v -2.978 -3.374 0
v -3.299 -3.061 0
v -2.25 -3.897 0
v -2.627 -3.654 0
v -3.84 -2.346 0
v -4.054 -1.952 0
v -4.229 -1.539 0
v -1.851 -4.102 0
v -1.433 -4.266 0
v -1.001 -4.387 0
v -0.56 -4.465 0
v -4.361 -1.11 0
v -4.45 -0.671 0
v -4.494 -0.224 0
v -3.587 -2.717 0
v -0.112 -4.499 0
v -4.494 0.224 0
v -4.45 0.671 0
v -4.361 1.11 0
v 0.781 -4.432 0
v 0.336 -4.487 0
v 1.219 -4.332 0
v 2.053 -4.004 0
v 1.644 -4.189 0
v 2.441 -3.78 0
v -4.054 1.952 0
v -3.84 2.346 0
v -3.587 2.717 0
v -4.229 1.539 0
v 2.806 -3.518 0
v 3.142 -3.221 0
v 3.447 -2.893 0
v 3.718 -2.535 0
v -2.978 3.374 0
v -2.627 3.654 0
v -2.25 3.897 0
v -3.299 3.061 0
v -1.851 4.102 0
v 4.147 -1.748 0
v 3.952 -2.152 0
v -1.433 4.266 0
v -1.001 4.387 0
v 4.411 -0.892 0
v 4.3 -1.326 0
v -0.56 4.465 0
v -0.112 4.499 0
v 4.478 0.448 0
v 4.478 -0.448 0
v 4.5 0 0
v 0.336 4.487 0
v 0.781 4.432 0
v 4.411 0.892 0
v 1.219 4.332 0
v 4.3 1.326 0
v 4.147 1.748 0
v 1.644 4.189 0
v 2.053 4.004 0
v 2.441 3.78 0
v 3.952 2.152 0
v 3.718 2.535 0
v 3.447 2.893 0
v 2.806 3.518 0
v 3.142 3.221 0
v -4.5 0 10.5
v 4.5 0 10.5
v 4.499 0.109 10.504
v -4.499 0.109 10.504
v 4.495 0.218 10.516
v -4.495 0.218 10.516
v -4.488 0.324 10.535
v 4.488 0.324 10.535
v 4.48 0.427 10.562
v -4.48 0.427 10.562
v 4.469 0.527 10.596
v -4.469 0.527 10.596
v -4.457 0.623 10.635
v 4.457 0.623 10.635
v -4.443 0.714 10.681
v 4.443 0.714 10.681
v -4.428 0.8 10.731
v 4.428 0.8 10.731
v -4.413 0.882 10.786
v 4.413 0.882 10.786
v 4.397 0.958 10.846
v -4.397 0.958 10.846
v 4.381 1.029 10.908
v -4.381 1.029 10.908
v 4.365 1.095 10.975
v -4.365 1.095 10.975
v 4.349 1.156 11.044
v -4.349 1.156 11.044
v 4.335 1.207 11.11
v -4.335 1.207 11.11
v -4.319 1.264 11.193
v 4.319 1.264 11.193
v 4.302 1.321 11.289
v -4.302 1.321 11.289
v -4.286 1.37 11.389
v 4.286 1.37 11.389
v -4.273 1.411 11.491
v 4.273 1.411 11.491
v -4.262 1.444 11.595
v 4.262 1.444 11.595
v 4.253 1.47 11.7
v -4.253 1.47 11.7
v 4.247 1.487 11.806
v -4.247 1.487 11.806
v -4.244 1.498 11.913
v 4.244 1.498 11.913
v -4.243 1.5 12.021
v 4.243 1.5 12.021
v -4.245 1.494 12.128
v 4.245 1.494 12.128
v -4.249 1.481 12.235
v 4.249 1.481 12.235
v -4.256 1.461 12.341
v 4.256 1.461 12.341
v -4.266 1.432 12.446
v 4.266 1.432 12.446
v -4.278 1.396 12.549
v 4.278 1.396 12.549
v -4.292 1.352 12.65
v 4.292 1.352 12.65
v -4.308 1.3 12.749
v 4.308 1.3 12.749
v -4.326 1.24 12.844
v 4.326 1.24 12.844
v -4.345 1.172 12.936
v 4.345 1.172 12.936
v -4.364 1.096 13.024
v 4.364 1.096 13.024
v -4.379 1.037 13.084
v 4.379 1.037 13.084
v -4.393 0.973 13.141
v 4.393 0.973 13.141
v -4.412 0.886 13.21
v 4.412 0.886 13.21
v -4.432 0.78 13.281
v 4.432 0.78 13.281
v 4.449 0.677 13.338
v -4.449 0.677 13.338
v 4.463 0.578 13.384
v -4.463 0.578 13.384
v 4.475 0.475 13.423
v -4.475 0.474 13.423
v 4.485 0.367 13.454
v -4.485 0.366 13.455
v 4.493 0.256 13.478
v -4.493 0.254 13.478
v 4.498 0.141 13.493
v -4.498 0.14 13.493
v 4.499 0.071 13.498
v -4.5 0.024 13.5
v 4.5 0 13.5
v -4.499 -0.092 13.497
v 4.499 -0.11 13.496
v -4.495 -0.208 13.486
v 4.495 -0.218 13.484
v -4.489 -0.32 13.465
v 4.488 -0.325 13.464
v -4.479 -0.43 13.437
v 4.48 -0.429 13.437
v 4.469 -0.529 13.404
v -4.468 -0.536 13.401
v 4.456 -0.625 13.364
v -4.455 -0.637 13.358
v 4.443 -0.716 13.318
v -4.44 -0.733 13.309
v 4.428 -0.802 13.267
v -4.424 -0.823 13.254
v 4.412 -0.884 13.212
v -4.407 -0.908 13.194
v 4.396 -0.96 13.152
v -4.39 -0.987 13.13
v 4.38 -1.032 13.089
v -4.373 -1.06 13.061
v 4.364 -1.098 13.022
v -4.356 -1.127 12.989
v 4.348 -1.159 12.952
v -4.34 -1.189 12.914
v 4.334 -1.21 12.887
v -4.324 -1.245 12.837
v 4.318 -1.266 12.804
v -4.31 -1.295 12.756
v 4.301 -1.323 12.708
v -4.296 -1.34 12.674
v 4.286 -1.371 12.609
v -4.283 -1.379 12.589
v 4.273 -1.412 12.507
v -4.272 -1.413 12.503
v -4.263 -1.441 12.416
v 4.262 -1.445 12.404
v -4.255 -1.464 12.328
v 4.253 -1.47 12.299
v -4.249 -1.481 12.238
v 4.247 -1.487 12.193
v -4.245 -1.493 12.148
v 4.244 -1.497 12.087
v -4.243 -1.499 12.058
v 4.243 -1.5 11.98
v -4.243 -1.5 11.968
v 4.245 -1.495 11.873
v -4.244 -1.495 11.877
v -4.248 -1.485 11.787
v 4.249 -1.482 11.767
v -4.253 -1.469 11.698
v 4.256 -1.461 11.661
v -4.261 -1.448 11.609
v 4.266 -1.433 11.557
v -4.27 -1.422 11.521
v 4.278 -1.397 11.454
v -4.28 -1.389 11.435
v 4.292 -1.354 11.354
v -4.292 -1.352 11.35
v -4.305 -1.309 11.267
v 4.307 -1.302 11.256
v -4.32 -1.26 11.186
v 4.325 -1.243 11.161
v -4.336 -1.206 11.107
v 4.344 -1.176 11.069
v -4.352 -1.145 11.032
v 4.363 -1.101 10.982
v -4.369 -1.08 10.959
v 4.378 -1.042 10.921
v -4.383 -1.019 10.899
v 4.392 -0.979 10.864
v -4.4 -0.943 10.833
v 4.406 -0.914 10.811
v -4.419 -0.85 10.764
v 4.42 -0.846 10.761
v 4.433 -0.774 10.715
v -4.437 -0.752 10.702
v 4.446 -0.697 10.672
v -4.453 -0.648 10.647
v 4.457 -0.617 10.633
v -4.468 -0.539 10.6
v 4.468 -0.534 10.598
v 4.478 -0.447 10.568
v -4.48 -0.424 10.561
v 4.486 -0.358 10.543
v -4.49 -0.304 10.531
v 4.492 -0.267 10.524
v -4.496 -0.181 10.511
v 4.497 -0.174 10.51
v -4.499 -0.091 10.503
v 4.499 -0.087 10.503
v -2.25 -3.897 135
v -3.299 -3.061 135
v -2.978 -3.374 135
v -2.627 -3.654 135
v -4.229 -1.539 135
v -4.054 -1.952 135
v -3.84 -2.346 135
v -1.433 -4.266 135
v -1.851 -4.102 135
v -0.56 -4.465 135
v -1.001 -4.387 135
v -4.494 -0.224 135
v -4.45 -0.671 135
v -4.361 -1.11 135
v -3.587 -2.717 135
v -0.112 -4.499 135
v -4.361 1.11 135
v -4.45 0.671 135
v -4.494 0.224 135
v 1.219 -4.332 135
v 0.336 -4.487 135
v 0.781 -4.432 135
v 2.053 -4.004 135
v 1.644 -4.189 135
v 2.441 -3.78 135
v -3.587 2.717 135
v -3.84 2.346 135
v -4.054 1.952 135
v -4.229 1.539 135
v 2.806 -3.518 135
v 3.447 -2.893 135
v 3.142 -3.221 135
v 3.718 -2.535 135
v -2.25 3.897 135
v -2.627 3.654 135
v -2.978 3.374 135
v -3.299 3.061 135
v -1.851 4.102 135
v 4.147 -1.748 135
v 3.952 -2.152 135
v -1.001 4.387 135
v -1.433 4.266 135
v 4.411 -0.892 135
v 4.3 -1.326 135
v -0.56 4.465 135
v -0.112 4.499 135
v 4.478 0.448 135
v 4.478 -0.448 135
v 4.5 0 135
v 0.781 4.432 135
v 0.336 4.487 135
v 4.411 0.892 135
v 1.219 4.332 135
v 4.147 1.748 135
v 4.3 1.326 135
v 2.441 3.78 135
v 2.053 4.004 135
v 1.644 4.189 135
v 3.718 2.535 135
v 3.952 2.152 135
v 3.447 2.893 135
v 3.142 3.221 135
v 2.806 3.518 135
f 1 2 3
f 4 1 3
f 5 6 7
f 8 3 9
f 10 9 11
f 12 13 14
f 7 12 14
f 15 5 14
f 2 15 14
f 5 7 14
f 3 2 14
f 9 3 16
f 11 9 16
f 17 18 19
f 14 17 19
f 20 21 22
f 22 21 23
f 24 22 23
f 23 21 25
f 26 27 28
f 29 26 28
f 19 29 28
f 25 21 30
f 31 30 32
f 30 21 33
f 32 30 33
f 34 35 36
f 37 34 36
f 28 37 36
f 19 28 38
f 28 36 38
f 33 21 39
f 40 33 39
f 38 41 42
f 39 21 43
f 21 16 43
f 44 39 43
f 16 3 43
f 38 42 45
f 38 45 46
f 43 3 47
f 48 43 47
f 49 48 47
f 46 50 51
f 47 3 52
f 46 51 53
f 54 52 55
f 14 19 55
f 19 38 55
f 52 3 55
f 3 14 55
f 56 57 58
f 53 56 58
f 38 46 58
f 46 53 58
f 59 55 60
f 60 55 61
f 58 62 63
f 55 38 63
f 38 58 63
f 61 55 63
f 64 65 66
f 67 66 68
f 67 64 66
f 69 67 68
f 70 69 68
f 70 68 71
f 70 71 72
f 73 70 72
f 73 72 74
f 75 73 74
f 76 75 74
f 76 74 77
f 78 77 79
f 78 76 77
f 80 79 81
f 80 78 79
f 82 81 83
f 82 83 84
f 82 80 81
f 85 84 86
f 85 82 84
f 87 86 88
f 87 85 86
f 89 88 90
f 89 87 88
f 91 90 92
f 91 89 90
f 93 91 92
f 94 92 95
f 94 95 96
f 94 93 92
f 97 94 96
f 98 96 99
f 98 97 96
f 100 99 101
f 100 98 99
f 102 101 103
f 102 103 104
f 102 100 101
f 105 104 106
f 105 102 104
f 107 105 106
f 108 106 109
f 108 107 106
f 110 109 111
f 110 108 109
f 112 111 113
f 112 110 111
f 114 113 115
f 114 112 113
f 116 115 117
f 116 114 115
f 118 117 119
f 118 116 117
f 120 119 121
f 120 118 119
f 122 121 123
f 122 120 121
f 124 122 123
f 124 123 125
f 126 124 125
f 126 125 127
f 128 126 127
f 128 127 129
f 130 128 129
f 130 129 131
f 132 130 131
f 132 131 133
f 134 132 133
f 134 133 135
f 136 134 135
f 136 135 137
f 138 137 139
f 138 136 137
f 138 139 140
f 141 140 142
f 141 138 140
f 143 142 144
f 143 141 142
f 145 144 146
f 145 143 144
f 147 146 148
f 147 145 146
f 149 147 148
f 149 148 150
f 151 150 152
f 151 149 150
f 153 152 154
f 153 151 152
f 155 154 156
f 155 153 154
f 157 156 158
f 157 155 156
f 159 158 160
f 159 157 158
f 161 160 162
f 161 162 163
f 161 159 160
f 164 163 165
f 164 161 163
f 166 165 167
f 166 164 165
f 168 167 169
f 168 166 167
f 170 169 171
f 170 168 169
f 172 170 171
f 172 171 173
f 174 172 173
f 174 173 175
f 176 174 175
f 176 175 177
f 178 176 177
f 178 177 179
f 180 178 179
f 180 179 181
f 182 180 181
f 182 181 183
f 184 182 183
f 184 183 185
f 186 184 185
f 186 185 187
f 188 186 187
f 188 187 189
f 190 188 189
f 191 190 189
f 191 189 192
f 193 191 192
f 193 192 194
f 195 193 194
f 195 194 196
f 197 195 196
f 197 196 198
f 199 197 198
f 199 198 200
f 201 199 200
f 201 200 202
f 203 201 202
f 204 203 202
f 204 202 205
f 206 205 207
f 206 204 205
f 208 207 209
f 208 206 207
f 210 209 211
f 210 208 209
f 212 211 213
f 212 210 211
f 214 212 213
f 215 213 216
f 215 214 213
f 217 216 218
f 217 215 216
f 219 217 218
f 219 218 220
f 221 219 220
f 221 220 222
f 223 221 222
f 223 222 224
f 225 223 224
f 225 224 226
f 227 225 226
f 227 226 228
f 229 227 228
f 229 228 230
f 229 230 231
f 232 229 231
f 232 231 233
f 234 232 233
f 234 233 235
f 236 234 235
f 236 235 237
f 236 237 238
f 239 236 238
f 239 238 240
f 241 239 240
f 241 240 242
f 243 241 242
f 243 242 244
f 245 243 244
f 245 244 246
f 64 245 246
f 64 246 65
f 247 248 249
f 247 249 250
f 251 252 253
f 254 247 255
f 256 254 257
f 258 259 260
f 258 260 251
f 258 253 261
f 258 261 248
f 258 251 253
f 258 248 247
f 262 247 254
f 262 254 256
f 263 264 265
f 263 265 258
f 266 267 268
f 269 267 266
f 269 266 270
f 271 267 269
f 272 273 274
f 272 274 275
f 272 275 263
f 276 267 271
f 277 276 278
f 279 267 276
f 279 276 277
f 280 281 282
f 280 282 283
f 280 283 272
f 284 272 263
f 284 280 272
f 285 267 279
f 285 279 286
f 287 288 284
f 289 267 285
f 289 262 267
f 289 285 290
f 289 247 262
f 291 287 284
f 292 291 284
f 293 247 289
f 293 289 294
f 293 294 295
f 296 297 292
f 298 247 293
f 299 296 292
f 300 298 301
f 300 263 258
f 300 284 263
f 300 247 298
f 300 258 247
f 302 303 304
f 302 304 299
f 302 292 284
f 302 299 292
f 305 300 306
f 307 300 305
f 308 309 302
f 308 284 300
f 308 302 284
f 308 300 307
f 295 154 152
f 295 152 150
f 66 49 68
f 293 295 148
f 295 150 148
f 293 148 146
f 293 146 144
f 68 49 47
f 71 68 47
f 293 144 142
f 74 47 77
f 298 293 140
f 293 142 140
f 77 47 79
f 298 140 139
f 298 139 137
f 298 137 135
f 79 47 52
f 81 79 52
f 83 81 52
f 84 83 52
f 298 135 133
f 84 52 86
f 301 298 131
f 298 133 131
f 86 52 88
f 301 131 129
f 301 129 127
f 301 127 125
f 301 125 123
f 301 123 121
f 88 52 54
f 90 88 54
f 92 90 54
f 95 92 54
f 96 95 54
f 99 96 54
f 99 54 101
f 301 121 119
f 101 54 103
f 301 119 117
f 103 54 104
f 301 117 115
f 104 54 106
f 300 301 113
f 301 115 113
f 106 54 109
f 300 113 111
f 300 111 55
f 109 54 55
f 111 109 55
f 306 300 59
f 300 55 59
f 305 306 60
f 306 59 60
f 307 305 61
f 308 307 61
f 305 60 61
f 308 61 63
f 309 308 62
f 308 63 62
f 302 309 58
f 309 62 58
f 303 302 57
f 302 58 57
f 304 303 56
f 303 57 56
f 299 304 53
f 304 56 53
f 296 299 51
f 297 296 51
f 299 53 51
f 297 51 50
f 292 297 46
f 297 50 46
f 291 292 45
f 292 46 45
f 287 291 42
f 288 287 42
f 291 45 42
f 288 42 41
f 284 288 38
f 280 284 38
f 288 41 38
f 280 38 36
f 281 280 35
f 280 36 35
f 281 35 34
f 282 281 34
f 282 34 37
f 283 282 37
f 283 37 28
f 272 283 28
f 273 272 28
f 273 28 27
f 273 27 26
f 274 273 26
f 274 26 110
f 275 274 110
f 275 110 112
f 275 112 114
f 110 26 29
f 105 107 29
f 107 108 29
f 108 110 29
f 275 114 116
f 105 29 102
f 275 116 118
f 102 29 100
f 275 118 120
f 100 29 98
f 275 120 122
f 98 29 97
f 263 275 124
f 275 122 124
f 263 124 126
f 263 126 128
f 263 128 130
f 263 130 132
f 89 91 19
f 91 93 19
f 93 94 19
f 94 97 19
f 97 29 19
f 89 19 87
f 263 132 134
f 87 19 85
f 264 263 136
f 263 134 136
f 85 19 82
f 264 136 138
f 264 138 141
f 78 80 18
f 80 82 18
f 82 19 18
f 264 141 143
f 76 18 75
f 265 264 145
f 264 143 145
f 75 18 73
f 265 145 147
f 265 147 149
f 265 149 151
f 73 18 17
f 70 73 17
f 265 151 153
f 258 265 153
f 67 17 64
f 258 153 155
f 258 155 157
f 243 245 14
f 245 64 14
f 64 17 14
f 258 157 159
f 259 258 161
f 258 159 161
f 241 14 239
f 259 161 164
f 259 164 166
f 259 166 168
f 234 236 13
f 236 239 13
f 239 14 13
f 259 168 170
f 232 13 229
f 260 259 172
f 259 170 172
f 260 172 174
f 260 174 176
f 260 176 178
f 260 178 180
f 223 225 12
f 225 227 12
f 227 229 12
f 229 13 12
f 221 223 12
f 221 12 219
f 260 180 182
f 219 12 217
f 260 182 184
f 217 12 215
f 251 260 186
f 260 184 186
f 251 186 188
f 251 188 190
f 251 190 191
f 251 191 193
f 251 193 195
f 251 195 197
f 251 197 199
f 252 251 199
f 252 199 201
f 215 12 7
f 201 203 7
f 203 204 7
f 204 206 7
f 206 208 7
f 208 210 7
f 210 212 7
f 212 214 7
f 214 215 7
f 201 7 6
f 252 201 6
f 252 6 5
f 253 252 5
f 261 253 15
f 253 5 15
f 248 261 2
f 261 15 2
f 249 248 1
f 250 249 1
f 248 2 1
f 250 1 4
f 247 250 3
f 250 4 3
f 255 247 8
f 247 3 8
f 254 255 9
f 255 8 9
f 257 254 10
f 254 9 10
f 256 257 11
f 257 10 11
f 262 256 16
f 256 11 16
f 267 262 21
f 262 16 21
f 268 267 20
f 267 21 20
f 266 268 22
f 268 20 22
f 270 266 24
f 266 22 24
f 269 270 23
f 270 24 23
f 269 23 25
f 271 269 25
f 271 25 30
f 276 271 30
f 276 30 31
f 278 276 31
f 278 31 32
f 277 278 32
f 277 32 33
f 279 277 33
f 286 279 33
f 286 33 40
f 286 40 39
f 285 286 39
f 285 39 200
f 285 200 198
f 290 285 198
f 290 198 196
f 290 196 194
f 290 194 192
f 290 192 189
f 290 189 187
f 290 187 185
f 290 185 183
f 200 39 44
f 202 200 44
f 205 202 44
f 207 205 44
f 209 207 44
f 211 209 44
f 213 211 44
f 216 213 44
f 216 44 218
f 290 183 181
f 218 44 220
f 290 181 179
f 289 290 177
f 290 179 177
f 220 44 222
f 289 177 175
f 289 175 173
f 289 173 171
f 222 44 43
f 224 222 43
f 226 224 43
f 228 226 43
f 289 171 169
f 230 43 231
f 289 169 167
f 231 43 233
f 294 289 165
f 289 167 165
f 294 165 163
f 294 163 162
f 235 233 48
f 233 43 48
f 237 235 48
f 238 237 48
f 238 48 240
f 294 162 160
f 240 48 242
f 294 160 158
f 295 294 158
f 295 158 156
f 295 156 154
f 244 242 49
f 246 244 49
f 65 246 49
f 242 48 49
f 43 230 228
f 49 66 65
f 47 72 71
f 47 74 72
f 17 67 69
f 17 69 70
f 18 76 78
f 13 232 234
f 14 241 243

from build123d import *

# Parameters (mm, degrees)
IZIM1_R                                = 4.5
Y_KSEKLIK_EKSTR_ZYON1_DEPTH            = 15
KES_EKSTR_ZYON1_REACH                  = 18.294
KES_EKSTR_ZYON1_END_RADIUS             = 4.5
IZIM2_R                                = 1.5
KES_EKSTR_ZYON1_DIRECTION_2_REACH      = 18.294
KES_EKSTR_ZYON1_DIRECTION_2_END_RADIUS = 4.5
IZIM3_R                                = 4.5
Y_KSEKLIK_EKSTR_ZYON2_DEPTH            = 120


with BuildPart() as part:
    # Çizim1 → Yükseklik-Ekstrüzyon1 (new body)
    with BuildSketch(Plane.XY):
        Circle(IZIM1_R)
    extrude(amount=Y_KSEKLIK_EKSTR_ZYON1_DEPTH)

    # Kes-Ekstrüzyon1: up to this cylinder (the profile starts inside it)
    kes_ekstr_zyon1_end = Plane(origin=(0, 0, 12), z_dir=(0, 0, -1)) * Cylinder(KES_EKSTR_ZYON1_END_RADIUS, 46.588, mode=Mode.PRIVATE)
    # Çizim2 → Kes-Ekstrüzyon1 (cut, up to the surface)
    with BuildSketch(Plane(origin=(0, 0, 0), x_dir=(0, 0, -1), z_dir=(1, 0, 0)), mode=Mode.PRIVATE) as kes_ekstr_zyon1_sk1:
        with Locations((-12, 0)):
            Circle(IZIM2_R)
    kes_ekstr_zyon1_tool1 = extrude(kes_ekstr_zyon1_sk1.sketch, amount=-KES_EKSTR_ZYON1_REACH, mode=Mode.PRIVATE) & kes_ekstr_zyon1_end
    add(kes_ekstr_zyon1_tool1.solids().sort_by_distance((0, 0, 12))[0], mode=Mode.SUBTRACT)

    # Kes-Ekstrüzyon1 direction 2: up to this cylinder (the profile starts inside it)
    kes_ekstr_zyon1_direction_2_end = Plane(origin=(0, 0, 12), z_dir=(0, 0, -1)) * Cylinder(KES_EKSTR_ZYON1_DIRECTION_2_END_RADIUS, 46.588, mode=Mode.PRIVATE)
    # Çizim2 → Kes-Ekstrüzyon1 direction 2 (cut, up to the surface)
    with BuildSketch(Plane(origin=(0, 0, 0), x_dir=(0, 0, -1), z_dir=(1, 0, 0)), mode=Mode.PRIVATE) as kes_ekstr_zyon1_direction_2_sk1:
        with Locations((-12, 0)):
            Circle(IZIM2_R)
    kes_ekstr_zyon1_direction_2_tool1 = extrude(kes_ekstr_zyon1_direction_2_sk1.sketch, amount=KES_EKSTR_ZYON1_DIRECTION_2_REACH, mode=Mode.PRIVATE) & kes_ekstr_zyon1_direction_2_end
    add(kes_ekstr_zyon1_direction_2_tool1.solids().sort_by_distance((0, 0, 12))[0], mode=Mode.SUBTRACT)

    # Çizim3 → Yükseklik-Ekstrüzyon2 (add)
    with BuildSketch(Plane.XY.offset(15)):
        Circle(IZIM3_R)
    extrude(amount=Y_KSEKLIK_EKSTR_ZYON2_DEPTH)


solid = part.part
